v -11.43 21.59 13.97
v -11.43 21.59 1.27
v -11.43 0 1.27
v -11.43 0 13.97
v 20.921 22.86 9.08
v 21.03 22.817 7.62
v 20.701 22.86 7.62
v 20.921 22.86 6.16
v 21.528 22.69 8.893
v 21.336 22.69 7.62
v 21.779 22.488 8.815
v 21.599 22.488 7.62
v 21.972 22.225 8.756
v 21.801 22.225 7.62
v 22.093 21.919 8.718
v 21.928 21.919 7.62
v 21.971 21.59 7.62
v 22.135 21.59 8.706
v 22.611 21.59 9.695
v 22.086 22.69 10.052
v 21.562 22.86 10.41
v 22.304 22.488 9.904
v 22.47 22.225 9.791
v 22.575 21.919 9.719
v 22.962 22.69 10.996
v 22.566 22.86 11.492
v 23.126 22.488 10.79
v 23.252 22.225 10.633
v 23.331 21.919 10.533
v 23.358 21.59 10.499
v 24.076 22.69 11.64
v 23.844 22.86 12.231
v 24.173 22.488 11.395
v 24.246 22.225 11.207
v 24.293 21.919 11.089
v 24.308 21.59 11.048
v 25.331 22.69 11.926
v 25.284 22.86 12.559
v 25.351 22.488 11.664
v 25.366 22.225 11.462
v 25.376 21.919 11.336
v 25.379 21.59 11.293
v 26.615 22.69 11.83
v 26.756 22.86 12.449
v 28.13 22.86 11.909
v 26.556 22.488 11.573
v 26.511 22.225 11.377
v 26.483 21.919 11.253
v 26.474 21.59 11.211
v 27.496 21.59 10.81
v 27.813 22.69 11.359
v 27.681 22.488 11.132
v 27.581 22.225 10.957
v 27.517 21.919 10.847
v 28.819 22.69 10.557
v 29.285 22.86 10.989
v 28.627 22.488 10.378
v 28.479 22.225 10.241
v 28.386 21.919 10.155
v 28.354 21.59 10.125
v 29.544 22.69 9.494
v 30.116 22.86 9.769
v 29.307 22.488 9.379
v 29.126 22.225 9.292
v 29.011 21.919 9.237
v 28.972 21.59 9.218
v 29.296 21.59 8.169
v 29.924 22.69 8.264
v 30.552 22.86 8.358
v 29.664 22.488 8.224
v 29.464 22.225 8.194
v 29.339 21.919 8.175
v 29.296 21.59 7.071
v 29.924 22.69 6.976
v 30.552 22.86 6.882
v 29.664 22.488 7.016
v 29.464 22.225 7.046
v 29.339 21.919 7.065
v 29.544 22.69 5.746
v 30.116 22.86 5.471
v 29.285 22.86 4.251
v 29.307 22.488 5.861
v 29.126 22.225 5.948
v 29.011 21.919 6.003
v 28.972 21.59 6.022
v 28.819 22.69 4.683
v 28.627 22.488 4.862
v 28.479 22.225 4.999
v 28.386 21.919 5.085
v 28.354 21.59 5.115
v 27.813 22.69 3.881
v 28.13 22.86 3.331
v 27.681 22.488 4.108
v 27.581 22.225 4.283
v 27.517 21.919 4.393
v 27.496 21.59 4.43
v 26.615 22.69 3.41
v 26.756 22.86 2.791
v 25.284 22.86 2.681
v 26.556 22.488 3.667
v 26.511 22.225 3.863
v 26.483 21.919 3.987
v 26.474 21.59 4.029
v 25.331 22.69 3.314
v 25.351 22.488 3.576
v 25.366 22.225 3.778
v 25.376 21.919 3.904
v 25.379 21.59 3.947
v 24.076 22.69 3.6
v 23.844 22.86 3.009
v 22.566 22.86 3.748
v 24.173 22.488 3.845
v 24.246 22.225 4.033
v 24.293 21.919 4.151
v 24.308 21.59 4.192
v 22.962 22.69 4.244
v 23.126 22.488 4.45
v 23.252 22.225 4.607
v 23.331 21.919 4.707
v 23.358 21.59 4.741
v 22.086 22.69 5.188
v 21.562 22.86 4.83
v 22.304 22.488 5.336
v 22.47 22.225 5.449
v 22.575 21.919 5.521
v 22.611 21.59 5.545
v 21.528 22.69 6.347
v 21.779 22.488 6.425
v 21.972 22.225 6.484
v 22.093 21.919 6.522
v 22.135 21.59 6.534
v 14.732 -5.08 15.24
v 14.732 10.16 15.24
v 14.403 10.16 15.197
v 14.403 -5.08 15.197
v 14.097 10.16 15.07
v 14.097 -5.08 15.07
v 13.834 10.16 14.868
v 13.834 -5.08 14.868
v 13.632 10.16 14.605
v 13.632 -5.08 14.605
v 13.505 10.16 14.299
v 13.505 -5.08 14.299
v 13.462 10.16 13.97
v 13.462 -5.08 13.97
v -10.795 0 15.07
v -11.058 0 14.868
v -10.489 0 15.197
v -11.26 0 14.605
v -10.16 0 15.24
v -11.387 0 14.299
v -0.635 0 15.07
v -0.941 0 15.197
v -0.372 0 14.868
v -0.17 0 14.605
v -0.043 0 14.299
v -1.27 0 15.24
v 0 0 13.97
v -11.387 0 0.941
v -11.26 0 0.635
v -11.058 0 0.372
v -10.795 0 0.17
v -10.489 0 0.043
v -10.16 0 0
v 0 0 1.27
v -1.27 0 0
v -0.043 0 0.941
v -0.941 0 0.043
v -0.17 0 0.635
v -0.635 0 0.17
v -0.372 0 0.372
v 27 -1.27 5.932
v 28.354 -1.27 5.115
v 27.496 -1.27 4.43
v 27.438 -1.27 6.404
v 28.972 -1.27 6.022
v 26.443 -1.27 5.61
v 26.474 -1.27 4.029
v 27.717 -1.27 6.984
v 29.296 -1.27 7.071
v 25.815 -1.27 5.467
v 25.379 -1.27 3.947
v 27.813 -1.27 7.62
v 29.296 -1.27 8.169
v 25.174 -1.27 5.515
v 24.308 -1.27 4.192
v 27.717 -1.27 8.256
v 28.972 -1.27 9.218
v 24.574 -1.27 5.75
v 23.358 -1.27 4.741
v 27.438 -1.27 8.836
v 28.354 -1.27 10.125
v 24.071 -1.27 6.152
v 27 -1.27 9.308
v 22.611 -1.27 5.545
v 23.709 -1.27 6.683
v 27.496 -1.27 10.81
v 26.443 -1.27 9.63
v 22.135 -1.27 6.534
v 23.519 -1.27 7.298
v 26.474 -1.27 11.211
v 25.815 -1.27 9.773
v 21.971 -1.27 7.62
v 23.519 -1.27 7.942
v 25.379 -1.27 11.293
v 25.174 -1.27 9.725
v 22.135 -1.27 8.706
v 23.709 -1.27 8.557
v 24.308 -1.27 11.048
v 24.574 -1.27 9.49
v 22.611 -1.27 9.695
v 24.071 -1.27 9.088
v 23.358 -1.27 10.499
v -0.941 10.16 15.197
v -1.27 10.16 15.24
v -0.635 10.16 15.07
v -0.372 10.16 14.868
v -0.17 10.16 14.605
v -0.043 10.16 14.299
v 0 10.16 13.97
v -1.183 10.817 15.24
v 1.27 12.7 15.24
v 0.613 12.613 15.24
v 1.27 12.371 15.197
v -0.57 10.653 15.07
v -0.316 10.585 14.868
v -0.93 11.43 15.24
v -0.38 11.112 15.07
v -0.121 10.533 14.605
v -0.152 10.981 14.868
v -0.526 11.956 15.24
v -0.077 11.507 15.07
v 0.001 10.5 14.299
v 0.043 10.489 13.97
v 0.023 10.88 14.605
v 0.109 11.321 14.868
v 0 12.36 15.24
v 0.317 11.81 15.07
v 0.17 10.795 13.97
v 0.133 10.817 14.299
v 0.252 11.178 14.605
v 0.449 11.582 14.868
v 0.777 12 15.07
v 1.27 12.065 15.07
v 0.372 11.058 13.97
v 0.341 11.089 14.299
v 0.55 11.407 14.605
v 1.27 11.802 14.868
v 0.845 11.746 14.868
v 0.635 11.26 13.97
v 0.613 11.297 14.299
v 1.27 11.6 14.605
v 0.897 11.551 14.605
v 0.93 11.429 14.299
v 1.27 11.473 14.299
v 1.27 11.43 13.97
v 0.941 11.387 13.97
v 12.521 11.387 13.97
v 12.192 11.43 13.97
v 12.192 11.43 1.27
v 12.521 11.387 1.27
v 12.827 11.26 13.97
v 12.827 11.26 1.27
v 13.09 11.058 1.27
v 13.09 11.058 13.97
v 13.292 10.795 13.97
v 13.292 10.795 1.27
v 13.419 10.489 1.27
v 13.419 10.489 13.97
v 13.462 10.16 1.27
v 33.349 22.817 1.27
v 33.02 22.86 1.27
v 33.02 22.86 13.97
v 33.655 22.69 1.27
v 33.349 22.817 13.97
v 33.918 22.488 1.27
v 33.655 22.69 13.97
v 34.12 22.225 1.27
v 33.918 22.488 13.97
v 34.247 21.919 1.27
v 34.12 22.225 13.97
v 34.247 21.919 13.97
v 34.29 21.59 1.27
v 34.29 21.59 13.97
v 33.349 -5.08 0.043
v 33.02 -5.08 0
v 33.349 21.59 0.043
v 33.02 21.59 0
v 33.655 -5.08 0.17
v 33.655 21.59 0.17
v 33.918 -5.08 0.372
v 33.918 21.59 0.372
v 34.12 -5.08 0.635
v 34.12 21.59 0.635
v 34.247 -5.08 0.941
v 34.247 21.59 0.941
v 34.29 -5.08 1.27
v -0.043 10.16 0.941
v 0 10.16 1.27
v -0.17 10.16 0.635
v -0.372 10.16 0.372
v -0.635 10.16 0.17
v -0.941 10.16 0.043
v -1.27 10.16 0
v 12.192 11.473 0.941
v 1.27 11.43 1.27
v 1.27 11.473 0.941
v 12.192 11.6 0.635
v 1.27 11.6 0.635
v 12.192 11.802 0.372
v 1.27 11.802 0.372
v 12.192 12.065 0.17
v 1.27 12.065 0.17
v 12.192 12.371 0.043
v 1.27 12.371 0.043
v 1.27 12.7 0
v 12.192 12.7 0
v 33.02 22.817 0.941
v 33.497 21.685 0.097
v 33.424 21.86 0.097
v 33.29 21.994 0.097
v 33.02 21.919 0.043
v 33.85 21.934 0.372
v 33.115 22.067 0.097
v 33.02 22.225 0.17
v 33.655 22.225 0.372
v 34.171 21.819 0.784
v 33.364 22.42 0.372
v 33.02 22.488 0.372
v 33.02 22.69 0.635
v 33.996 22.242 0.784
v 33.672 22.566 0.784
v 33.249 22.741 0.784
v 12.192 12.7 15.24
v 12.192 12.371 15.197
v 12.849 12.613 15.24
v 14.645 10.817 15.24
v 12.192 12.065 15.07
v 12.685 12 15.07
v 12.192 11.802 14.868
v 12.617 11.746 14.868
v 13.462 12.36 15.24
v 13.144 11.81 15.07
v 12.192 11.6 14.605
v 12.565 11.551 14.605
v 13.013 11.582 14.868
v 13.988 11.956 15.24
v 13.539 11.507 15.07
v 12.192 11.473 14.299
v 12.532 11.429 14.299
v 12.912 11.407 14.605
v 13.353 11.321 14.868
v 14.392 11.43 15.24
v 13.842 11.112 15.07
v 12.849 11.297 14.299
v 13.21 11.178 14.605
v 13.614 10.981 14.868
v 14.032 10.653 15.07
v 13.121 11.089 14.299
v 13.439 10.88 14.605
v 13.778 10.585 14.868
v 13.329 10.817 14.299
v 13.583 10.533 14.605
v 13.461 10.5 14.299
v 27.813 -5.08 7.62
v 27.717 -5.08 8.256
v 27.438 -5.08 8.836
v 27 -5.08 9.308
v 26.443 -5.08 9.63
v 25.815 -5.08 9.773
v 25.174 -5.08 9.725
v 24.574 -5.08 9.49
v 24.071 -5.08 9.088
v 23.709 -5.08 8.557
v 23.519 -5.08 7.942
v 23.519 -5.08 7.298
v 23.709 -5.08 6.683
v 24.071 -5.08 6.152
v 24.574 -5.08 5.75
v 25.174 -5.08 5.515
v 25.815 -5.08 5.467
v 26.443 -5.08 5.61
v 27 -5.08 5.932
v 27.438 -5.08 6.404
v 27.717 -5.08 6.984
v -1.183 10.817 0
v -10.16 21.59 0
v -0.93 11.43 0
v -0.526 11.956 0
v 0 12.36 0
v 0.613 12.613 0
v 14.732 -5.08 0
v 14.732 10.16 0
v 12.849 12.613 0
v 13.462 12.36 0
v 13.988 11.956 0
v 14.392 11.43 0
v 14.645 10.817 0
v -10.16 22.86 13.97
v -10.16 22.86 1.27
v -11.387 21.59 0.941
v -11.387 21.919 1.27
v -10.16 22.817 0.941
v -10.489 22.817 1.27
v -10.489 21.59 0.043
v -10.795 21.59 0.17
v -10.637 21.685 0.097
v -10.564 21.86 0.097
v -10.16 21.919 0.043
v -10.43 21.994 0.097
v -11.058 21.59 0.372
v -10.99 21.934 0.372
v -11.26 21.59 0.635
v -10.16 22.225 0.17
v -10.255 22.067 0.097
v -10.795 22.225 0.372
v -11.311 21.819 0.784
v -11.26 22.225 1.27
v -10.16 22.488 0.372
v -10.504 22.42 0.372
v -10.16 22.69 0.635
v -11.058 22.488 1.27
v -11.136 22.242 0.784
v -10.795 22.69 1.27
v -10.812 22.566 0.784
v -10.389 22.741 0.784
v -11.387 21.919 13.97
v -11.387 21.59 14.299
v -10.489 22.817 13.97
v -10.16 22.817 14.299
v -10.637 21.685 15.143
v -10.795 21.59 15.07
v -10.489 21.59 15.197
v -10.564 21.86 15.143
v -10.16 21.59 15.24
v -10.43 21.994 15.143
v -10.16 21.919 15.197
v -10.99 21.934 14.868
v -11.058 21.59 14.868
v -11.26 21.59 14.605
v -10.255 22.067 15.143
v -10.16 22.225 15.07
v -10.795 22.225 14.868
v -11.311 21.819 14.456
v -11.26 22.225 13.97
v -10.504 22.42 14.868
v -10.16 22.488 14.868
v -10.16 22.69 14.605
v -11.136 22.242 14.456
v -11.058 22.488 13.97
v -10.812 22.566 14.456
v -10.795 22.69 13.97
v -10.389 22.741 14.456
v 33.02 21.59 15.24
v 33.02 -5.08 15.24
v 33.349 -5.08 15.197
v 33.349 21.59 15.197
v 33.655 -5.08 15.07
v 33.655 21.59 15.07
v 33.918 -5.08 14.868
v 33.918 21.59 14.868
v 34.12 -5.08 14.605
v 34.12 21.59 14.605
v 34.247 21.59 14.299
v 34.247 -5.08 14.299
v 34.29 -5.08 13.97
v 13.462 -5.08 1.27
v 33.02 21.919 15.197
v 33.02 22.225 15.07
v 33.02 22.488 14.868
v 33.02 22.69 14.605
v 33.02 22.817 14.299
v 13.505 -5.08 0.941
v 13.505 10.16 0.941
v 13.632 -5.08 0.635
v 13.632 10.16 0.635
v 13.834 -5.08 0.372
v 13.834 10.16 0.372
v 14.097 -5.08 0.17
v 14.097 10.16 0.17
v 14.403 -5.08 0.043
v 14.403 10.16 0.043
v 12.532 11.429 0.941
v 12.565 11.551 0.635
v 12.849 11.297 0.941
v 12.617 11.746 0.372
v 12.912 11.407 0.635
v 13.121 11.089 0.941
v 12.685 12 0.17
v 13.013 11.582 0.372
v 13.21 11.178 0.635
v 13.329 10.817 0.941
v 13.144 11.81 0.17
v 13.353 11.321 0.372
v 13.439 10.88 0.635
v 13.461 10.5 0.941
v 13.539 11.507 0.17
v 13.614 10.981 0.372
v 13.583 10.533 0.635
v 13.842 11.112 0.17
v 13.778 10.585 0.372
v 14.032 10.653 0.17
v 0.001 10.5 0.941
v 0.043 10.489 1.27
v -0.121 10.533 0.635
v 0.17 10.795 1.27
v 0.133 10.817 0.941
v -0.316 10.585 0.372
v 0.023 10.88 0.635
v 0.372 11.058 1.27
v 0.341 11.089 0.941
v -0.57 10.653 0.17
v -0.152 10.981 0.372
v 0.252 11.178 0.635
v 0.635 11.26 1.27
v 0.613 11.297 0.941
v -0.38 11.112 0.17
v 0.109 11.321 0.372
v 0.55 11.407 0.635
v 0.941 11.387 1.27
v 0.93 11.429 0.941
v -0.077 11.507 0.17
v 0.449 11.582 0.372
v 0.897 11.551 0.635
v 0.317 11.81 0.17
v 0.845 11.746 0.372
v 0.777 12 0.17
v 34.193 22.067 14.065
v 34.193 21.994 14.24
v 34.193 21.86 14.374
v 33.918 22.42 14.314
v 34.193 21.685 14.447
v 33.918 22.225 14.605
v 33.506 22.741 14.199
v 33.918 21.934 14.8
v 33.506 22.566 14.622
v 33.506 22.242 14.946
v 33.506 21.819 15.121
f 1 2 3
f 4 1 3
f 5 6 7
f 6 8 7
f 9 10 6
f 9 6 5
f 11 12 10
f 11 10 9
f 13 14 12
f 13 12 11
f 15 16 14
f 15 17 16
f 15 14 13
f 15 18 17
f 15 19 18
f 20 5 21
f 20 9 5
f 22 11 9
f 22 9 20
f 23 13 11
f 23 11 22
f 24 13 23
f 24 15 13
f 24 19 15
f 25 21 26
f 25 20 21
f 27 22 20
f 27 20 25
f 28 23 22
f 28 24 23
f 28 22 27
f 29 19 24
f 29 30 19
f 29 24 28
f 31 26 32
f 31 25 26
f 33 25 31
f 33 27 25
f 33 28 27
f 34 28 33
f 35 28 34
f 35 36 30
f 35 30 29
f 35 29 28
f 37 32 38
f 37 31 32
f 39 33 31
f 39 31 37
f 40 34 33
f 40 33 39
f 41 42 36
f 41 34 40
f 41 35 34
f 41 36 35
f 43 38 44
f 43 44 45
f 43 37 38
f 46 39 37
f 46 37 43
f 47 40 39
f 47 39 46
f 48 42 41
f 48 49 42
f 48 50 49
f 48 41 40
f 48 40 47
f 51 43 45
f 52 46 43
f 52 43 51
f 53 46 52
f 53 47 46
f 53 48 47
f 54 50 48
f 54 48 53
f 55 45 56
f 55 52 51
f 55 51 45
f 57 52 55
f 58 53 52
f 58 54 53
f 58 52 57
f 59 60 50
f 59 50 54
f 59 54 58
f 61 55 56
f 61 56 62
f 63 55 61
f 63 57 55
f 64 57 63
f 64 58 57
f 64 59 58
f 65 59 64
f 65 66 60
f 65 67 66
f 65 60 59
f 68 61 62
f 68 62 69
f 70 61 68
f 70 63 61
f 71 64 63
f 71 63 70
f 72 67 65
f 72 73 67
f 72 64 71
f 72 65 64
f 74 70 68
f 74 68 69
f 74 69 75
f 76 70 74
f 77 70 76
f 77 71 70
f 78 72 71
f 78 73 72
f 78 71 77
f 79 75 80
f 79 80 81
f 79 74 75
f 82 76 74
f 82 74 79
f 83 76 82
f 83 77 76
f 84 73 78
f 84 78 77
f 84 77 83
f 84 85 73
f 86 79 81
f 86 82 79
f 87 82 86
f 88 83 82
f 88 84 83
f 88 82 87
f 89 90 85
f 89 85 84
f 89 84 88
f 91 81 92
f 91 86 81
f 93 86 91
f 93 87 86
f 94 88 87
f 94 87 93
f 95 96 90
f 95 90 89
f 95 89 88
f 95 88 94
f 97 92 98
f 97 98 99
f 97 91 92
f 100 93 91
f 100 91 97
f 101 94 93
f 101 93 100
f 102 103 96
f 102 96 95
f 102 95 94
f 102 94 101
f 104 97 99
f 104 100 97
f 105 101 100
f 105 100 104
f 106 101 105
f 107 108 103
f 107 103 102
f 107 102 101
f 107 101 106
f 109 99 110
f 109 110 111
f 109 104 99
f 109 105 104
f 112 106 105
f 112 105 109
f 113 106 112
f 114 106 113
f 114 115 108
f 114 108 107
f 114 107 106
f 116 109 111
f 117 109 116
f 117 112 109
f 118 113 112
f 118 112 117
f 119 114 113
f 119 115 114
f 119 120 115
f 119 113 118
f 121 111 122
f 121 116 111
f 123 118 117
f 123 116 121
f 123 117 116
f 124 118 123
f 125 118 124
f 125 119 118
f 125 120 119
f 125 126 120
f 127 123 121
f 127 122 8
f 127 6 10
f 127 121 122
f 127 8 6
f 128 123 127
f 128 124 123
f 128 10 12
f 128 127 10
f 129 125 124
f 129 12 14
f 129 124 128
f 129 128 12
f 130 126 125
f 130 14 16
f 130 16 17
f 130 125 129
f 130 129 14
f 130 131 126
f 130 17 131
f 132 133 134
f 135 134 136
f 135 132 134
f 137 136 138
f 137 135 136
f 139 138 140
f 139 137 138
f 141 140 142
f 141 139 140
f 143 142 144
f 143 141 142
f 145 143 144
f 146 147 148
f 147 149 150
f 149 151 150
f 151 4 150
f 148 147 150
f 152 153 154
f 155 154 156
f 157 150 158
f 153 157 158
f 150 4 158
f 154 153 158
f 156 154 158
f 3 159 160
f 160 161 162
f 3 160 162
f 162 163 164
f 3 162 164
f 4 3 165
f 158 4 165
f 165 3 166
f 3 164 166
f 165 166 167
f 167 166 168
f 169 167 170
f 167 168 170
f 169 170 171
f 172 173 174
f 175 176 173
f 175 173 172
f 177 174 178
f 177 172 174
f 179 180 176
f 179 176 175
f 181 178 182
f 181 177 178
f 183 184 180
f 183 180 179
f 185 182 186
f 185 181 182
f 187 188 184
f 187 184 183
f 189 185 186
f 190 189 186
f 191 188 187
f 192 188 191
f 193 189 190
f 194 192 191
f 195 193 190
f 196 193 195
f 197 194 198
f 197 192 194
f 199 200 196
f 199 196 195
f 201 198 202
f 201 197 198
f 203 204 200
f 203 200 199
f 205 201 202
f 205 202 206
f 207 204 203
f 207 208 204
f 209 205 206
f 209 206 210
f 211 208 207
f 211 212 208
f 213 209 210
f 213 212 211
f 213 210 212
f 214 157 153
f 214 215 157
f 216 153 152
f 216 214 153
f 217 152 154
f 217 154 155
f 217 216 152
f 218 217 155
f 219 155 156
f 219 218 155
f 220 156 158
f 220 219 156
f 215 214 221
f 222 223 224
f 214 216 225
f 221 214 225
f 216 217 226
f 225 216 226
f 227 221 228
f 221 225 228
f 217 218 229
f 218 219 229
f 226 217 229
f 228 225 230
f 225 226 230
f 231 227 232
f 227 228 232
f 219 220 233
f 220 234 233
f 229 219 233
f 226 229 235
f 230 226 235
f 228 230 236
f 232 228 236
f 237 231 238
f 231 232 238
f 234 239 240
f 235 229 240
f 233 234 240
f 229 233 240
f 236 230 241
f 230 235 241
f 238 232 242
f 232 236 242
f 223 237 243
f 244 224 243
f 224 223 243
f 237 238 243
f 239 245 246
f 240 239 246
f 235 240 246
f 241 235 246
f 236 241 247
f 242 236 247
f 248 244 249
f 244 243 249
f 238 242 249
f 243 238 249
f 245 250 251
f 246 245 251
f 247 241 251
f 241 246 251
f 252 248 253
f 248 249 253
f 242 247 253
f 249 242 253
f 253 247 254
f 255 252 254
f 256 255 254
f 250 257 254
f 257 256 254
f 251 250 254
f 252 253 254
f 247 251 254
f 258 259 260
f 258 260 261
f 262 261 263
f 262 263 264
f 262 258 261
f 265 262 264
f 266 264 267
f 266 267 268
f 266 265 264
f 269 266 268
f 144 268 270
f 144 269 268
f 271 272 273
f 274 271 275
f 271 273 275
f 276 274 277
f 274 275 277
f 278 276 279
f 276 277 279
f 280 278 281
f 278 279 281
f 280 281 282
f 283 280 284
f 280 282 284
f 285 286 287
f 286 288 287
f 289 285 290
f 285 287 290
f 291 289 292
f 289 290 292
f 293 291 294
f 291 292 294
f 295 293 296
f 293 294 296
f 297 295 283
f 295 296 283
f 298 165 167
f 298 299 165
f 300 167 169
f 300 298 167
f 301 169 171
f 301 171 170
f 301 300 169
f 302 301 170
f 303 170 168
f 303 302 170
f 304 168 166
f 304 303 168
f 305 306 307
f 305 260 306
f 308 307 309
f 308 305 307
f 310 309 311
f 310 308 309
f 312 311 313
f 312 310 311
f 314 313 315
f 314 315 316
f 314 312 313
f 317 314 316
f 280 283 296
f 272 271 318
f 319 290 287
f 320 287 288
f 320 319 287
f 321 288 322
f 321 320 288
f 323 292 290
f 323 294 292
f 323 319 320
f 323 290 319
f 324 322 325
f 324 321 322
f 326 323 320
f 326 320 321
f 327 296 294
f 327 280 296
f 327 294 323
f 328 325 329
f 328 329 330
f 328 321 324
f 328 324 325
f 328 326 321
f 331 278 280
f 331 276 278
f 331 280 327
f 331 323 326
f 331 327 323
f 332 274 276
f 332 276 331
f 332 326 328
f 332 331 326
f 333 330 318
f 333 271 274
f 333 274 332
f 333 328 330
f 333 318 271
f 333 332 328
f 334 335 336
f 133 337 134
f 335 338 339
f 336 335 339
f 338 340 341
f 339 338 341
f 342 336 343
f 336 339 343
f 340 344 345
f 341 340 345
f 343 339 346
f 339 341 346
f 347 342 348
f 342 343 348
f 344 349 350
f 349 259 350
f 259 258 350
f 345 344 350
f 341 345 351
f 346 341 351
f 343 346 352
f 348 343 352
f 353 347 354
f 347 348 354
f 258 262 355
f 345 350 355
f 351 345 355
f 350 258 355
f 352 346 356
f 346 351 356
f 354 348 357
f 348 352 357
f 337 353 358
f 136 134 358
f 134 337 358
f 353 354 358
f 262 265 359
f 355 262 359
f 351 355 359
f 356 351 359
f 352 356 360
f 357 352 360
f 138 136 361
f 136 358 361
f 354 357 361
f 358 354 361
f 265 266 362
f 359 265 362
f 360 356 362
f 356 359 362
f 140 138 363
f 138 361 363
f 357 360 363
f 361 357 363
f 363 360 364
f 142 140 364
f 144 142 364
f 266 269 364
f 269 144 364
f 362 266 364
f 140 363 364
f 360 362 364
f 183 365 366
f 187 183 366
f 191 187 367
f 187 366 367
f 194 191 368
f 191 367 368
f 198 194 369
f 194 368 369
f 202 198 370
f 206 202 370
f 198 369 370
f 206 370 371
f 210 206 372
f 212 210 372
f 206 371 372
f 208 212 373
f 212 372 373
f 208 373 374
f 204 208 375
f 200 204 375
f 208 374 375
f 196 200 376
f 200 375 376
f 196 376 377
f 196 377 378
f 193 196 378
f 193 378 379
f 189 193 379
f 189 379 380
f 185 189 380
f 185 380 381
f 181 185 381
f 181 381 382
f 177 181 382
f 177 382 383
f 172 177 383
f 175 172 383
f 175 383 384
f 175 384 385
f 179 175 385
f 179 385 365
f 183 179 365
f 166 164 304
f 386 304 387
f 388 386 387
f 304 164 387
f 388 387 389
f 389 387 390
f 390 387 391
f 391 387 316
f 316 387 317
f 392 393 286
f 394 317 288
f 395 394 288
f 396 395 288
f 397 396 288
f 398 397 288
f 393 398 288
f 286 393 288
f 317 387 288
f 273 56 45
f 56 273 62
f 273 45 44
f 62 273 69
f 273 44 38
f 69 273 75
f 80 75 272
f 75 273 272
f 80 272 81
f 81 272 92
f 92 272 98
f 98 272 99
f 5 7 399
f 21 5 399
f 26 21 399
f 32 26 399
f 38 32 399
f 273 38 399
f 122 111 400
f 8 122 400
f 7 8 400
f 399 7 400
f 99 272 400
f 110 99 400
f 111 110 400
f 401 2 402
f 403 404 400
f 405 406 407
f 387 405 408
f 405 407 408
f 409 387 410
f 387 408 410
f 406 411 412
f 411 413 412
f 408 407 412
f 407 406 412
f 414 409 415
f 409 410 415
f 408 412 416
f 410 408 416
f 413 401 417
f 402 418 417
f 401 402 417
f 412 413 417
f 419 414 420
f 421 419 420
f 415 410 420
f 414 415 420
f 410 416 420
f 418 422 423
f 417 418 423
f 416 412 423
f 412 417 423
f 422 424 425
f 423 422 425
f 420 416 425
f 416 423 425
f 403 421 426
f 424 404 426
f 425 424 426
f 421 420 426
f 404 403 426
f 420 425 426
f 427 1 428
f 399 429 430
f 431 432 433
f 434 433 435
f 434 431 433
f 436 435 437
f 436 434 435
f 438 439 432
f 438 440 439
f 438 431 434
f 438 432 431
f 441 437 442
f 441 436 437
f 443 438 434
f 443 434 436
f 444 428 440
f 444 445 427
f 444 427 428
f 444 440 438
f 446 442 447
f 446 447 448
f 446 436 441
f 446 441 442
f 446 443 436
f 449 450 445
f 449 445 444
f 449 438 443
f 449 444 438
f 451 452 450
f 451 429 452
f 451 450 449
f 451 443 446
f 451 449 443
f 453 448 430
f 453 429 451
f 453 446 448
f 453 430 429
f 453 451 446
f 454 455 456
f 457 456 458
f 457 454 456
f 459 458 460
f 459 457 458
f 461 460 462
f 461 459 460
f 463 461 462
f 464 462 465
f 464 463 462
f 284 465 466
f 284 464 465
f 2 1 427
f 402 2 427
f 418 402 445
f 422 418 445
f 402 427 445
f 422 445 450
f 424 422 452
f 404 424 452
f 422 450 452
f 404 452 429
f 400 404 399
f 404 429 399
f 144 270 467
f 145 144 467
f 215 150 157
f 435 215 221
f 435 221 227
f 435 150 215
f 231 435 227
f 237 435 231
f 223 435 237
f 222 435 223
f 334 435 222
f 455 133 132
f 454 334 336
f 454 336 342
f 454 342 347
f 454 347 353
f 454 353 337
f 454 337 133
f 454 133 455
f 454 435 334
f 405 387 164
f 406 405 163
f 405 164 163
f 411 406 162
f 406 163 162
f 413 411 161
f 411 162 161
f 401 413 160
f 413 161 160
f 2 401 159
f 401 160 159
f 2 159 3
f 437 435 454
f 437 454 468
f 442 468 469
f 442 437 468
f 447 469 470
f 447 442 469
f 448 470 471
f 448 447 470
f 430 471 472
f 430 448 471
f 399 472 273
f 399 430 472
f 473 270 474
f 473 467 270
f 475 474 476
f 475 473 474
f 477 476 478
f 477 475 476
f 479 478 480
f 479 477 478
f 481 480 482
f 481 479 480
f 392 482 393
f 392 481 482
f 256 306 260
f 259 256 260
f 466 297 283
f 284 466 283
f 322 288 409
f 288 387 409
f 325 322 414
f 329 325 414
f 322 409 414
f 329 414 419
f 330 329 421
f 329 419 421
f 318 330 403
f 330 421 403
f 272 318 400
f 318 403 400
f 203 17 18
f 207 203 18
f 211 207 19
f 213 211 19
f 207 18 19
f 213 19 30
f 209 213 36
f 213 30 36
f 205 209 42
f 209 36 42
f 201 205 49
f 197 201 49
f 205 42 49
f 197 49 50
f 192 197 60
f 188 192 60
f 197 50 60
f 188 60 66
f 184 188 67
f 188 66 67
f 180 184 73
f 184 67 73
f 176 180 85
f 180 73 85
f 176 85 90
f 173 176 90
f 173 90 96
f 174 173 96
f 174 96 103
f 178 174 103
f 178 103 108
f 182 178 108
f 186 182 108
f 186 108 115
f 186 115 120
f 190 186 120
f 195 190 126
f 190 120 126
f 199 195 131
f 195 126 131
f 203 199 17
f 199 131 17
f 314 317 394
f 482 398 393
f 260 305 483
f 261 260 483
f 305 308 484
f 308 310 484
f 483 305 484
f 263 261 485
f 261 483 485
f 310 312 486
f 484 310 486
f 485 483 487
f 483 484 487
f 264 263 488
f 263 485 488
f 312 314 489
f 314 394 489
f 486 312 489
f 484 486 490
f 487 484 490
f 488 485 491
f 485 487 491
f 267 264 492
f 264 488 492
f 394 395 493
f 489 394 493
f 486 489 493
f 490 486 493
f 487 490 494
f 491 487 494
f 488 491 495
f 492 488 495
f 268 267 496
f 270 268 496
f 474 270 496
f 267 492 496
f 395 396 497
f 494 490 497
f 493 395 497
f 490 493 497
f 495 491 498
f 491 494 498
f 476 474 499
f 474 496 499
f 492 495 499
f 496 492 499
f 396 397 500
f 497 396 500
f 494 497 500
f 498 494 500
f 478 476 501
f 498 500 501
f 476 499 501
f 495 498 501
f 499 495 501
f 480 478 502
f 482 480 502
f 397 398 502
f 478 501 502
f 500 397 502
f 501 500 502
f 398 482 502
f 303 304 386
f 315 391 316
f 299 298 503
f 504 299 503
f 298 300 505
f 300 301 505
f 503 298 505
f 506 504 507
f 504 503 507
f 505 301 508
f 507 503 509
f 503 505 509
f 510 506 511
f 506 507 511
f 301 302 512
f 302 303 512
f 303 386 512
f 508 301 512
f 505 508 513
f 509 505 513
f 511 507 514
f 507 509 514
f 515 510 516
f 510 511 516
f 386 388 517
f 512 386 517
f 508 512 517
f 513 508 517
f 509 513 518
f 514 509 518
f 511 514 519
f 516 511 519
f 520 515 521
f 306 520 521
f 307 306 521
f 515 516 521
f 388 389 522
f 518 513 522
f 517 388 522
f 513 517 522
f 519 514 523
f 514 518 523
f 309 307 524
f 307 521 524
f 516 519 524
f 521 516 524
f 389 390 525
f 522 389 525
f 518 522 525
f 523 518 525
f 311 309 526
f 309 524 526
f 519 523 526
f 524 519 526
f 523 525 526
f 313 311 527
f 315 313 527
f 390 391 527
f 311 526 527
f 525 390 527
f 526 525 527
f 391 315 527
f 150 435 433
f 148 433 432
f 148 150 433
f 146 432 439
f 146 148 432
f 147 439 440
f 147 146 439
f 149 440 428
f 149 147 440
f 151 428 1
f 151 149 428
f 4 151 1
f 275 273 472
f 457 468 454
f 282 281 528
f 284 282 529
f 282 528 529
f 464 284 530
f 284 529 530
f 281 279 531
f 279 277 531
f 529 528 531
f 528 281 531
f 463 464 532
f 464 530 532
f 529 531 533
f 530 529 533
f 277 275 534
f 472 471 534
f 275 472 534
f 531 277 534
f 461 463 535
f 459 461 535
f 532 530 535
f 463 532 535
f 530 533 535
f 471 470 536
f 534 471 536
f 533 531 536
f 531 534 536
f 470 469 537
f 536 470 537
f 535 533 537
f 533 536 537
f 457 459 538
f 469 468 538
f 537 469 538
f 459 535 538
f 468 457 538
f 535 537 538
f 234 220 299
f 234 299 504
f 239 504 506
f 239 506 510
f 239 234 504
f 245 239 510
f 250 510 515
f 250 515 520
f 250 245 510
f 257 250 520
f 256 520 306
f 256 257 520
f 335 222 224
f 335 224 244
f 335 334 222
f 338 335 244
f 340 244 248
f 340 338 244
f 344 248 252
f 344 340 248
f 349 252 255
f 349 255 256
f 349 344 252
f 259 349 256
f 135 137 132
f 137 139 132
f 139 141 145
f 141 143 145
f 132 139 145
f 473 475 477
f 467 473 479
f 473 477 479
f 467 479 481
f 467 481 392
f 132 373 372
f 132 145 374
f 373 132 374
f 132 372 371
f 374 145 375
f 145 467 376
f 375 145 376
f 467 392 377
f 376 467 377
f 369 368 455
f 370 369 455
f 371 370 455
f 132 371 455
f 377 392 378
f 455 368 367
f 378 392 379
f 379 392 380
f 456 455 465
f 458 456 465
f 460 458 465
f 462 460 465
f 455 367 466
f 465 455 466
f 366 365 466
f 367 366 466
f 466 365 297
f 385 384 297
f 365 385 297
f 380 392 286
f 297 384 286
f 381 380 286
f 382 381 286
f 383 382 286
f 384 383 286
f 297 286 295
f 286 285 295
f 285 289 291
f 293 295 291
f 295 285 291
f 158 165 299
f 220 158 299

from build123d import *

# Parameters (mm, degrees)
F1_DEPTH = 15.24
F2_R     = 2.159
F3_DEPTH = 27.94
F4_R     = 3.683
F5_DEPTH = 24.13
F6_F1_R  = 1.27
F6_F2_R  = 1.27
F6_F3_R  = 1.27


with BuildPart() as f1:
    # F0 (on Top) → F1 (new body)
    with BuildSketch(Plane.XY):
        Polygon((-11.43, 0), (0, 0), (0, 11.43), (13.462, 11.43), (13.462, -5.08), (34.29, -5.08), (34.29, 22.86), (-11.43, 22.86), align=None)
    extrude(amount=F1_DEPTH)

    # F2 (on face) → F3 (cut, through all)
    with BuildSketch(Plane.XZ.offset(5.08)):
        with Locations((25.654, 7.62)):
            Circle(F2_R)
    extrude(amount=-F3_DEPTH, mode=Mode.SUBTRACT)

    # F4 (on face) → F5 (cut)
    with BuildSketch(Plane(origin=(0, 22.86, 0), x_dir=(-1, 0, 0), z_dir=(0, 1, 0))):
        with Locations((-25.654, 7.62)):
            Circle(F4_R)
    extrude(amount=-F5_DEPTH, mode=Mode.SUBTRACT)

    # F6: fillet of radius 1.27 on 14 edges, made by hand

    # F6_f1
    f6_f1_edges = [f1.edges().sort_by_distance(p)[0] for p in [
        (0, 11.43, 7.62),
        (13.462, 11.43, 7.62),
    ]]
    fillet(f6_f1_edges, radius=F6_F1_R)

    # F6_f2
    f6_f2_edges = [f1.edges().sort_by_distance(p)[0] for p in [
        (6.731, 11.43, 15.24),
        (-11.43, 22.86, 7.62),
        (-11.43, 11.43, 15.24),
        (-11.43, 11.43, 0),
        (11.43, 22.86, 15.24),
        (34.29, 22.86, 7.62),
        (34.29, 8.89, 15.24),
        (34.29, 8.89, 0),
        (11.43, 22.86, 0),
        (29.337, 22.86, 7.62),
        (0.3719743879, 11.0580256121, 15.24),
        (13.0900256121, 11.0580256121, 15.24),
    ]]
    fillet(f6_f2_edges, radius=F6_F2_R)

    # F6_f3
    f6_f3_edges = [f1.edges().sort_by_distance(p)[0] for p in [
        (0, 5.08, 0),
        (6.731, 11.43, 0),
        (0.3719743879, 11.0580256121, 0),
        (13.0900256121, 11.0580256121, 0),
    ]]
    fillet(f6_f3_edges, radius=F6_F3_R)


solid = f1.part
